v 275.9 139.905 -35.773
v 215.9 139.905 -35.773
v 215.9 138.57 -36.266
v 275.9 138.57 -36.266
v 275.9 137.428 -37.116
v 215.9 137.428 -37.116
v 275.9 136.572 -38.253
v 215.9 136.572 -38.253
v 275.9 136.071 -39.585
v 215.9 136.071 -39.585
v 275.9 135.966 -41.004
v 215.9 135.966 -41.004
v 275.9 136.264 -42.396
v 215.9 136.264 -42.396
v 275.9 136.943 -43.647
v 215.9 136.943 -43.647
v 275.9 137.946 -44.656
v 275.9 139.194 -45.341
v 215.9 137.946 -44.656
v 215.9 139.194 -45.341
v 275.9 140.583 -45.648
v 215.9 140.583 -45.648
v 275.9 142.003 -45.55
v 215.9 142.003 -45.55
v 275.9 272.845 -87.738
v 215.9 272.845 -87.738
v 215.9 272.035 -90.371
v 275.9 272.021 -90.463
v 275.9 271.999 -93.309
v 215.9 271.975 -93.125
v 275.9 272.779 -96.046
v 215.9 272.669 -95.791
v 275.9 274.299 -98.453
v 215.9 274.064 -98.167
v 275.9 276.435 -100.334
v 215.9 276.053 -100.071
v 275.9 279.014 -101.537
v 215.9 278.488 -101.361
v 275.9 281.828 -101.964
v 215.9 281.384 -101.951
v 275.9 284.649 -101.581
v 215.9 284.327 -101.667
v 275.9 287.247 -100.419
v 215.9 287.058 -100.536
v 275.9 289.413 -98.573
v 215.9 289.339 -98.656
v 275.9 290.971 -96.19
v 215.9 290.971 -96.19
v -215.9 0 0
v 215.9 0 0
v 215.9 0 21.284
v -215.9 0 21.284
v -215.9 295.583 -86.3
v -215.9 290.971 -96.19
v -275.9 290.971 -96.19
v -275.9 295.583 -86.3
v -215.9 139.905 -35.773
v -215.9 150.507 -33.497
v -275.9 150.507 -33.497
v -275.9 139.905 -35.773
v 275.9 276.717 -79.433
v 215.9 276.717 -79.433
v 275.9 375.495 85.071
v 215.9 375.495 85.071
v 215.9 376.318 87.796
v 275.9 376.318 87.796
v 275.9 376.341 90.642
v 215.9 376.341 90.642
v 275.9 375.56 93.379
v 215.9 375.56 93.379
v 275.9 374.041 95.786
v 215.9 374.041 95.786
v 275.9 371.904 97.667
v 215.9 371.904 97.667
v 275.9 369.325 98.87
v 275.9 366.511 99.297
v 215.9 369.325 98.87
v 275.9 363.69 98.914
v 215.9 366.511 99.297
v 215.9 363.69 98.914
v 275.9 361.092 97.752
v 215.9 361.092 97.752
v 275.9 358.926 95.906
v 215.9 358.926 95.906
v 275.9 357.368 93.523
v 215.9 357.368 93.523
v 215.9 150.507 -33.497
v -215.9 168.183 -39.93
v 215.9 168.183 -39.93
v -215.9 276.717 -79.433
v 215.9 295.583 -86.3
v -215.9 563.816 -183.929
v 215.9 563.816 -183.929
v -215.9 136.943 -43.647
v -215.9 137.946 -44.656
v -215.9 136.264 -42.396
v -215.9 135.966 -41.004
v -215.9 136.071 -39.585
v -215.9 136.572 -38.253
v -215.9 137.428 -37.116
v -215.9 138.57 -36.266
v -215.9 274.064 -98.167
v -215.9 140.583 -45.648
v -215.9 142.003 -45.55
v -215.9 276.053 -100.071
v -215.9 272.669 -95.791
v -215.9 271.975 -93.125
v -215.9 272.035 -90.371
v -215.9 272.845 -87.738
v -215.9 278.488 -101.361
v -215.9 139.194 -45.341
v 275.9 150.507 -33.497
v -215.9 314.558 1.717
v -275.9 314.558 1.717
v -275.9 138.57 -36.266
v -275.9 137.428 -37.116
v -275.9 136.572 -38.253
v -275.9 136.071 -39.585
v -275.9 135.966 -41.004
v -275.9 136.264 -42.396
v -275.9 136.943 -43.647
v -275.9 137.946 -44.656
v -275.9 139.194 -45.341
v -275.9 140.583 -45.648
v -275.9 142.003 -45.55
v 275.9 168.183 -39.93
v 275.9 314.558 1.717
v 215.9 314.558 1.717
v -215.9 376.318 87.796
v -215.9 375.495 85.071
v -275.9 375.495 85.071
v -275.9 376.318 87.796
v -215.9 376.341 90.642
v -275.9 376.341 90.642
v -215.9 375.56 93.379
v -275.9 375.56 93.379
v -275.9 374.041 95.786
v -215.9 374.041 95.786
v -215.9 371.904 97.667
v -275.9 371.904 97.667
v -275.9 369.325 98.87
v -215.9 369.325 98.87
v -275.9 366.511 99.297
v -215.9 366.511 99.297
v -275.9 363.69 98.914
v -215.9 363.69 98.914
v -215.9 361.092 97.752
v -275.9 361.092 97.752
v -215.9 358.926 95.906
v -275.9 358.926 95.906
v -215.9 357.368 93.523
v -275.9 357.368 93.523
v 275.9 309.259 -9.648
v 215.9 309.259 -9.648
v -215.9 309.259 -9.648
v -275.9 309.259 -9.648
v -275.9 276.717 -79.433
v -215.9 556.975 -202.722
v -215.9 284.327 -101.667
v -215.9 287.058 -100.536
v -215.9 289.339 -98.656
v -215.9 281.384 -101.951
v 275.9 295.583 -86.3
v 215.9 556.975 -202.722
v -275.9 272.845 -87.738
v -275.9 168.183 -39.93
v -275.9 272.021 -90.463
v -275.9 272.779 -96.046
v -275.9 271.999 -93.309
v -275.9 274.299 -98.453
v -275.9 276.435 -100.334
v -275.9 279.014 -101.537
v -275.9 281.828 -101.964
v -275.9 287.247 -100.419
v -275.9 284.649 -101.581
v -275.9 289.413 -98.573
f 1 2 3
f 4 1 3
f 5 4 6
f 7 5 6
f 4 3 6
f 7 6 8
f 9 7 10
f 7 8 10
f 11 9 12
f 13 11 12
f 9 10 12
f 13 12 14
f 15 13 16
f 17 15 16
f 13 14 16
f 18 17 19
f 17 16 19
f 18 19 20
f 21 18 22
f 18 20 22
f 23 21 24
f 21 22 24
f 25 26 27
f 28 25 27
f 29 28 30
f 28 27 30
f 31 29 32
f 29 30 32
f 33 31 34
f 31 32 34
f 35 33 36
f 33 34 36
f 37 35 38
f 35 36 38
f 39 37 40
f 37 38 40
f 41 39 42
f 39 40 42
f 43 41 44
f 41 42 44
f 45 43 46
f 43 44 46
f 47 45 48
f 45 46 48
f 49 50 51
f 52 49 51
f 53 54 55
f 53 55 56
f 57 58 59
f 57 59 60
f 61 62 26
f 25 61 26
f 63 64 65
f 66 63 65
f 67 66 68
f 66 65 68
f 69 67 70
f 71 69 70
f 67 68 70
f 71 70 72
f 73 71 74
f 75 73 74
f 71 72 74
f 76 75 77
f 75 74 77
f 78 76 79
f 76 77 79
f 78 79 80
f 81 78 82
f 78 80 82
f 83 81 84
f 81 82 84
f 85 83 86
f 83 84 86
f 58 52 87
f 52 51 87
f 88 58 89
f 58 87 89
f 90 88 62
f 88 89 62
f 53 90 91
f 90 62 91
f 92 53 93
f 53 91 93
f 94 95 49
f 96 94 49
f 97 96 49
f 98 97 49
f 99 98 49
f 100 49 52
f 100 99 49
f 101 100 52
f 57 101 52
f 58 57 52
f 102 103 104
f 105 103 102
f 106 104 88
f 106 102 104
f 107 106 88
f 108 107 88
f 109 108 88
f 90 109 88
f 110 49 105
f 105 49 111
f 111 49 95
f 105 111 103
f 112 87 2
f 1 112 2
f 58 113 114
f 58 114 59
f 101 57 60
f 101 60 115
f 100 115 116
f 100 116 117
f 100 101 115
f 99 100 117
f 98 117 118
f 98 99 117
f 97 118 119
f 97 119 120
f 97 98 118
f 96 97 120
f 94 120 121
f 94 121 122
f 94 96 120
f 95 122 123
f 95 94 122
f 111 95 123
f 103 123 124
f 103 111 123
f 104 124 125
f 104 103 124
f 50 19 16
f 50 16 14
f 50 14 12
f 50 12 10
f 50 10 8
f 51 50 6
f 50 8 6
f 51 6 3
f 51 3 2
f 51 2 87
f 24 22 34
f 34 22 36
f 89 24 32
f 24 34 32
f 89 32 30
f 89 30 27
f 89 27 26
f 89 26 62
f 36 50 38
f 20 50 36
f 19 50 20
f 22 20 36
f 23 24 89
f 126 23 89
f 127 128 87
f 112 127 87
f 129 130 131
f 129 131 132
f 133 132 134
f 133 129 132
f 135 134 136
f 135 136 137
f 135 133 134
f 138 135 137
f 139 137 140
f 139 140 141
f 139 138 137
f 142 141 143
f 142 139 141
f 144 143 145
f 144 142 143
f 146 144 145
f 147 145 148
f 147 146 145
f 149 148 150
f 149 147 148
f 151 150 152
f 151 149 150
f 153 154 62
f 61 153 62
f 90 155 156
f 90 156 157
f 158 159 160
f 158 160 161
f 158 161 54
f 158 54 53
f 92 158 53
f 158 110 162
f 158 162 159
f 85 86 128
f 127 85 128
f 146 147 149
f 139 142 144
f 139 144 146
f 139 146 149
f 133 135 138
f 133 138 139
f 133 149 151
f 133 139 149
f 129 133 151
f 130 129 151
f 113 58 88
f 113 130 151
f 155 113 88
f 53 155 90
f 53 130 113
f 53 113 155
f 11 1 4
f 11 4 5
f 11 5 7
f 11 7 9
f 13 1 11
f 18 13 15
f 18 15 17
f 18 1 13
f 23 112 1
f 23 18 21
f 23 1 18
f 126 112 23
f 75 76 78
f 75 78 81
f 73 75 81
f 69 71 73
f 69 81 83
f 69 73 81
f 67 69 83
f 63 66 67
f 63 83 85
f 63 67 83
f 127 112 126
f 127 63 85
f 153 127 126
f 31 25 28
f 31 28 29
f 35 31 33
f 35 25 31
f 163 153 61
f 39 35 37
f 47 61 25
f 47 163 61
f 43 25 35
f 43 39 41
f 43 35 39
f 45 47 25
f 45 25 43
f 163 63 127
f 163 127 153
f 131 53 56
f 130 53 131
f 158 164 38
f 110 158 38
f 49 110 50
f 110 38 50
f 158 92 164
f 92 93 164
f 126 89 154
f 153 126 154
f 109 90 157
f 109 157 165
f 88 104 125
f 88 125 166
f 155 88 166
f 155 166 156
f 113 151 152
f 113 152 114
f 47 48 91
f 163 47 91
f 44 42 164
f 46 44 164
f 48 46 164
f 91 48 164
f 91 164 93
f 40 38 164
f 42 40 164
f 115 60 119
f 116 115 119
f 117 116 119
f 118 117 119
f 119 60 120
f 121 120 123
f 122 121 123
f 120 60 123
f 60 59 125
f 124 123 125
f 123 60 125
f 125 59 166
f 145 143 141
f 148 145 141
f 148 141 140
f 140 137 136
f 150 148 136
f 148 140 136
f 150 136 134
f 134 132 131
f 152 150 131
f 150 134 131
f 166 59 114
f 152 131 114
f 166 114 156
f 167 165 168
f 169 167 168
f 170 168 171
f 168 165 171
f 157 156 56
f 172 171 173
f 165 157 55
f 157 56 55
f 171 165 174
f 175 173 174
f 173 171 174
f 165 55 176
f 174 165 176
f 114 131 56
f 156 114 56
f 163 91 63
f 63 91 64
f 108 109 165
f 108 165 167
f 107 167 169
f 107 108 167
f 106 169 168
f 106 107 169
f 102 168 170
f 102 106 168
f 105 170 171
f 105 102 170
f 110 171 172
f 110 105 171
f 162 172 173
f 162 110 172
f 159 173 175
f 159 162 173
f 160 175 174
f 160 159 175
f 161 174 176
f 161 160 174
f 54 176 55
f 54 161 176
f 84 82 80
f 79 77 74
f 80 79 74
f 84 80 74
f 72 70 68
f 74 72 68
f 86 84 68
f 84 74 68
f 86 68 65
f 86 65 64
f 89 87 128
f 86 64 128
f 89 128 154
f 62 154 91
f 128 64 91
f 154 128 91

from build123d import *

# Parameters (mm, degrees)
BOSS_EXTRUDE1_DEPTH = 215.9
BOSS_EXTRUDE2_DEPTH = 60


with BuildPart() as part:
    # Sketch1 → Boss-Extrude1 (new, symmetric)
    with BuildSketch(Plane(origin=(0, 0, 0), x_dir=(0, 0, -1), z_dir=(1, 0, 0))):
        Polygon((0, 0), (-21.28355545, 0), (183.928530546, 563.815572472), (202.722382962, 556.975169605), align=None)
    extrude(amount=BOSS_EXTRUDE1_DEPTH, both=True)

    # Sketch2 → Boss-Extrude2 (add)
    with BuildSketch(Plane(origin=(215.9, 0, 0), x_dir=(0, 0, -1), z_dir=(1, 0, 0))):
        with BuildLine():
            Line((-1.717345436, 314.558459548), (9.648049621, 309.258688795))
            Line((9.648049621, 309.258688795), (6.222130729, 325.218973302))
            ThreePointArc((6.222130729, 325.218973302), (0.284125678, 329.058256569), (-3.55515759, 323.120251518))
            Line((-3.55515759, 323.120251518), (-1.717345436, 314.558459548))
        make_face()
        with BuildLine():
            Line((9.648049621, 309.258688795), (79.43330187, 276.717291245))
            Line((79.43330187, 276.717291245), (86.299833965, 295.582933124))
            Line((86.299833965, 295.582933124), (-85.071109517, 375.494516454))
            ThreePointArc((-85.071109517, 375.494516454), (-98.360370005, 370.657621201), (-93.523474752, 357.368360714))
            Line((-93.523474752, 357.368360714), (-1.717345436, 314.558459548))
            Line((-1.717345436, 314.558459548), (-3.55515759, 323.120251518))
            ThreePointArc((-3.55515759, 323.120251518), (0.284125678, 329.058256569), (6.222130729, 325.218973302))
            Line((6.222130729, 325.218973302), (9.648049621, 309.258688795))
        make_face()
        Polygon((39.930228547, 168.18348929), (9.648049621, 309.258688795), (-1.717345436, 314.558459548), (33.496662431, 150.507411661), align=None)
        with BuildLine():
            Line((45.549887934, 142.00325401), (39.930228547, 168.18348929))
            Line((39.930228547, 168.18348929), (33.496662431, 150.507411661))
            Line((33.496662431, 150.507411661), (35.772599615, 139.904532226))
            ThreePointArc((35.772599615, 139.904532226), (41.710604666, 136.065248958), (45.549887934, 142.00325401))
        make_face()
        with BuildLine():
            Line((79.43330187, 276.717291245), (87.738082656, 272.844708365))
            ThreePointArc((87.738082656, 272.844708365), (101.027343143, 277.681603618), (96.19044789, 290.970864106))
            Line((96.19044789, 290.970864106), (86.299833965, 295.582933124))
            Line((86.299833965, 295.582933124), (79.43330187, 276.717291245))
        make_face()
    boss_extrude2 = extrude(amount=BOSS_EXTRUDE2_DEPTH)

    # Mirror1: Boss-Extrude2 across plane
    add(boss_extrude2.mirror(Plane(origin=(0, 0, 0), x_dir=(0, 0, 1), z_dir=(1, 0, 0))))


solid = part.part
